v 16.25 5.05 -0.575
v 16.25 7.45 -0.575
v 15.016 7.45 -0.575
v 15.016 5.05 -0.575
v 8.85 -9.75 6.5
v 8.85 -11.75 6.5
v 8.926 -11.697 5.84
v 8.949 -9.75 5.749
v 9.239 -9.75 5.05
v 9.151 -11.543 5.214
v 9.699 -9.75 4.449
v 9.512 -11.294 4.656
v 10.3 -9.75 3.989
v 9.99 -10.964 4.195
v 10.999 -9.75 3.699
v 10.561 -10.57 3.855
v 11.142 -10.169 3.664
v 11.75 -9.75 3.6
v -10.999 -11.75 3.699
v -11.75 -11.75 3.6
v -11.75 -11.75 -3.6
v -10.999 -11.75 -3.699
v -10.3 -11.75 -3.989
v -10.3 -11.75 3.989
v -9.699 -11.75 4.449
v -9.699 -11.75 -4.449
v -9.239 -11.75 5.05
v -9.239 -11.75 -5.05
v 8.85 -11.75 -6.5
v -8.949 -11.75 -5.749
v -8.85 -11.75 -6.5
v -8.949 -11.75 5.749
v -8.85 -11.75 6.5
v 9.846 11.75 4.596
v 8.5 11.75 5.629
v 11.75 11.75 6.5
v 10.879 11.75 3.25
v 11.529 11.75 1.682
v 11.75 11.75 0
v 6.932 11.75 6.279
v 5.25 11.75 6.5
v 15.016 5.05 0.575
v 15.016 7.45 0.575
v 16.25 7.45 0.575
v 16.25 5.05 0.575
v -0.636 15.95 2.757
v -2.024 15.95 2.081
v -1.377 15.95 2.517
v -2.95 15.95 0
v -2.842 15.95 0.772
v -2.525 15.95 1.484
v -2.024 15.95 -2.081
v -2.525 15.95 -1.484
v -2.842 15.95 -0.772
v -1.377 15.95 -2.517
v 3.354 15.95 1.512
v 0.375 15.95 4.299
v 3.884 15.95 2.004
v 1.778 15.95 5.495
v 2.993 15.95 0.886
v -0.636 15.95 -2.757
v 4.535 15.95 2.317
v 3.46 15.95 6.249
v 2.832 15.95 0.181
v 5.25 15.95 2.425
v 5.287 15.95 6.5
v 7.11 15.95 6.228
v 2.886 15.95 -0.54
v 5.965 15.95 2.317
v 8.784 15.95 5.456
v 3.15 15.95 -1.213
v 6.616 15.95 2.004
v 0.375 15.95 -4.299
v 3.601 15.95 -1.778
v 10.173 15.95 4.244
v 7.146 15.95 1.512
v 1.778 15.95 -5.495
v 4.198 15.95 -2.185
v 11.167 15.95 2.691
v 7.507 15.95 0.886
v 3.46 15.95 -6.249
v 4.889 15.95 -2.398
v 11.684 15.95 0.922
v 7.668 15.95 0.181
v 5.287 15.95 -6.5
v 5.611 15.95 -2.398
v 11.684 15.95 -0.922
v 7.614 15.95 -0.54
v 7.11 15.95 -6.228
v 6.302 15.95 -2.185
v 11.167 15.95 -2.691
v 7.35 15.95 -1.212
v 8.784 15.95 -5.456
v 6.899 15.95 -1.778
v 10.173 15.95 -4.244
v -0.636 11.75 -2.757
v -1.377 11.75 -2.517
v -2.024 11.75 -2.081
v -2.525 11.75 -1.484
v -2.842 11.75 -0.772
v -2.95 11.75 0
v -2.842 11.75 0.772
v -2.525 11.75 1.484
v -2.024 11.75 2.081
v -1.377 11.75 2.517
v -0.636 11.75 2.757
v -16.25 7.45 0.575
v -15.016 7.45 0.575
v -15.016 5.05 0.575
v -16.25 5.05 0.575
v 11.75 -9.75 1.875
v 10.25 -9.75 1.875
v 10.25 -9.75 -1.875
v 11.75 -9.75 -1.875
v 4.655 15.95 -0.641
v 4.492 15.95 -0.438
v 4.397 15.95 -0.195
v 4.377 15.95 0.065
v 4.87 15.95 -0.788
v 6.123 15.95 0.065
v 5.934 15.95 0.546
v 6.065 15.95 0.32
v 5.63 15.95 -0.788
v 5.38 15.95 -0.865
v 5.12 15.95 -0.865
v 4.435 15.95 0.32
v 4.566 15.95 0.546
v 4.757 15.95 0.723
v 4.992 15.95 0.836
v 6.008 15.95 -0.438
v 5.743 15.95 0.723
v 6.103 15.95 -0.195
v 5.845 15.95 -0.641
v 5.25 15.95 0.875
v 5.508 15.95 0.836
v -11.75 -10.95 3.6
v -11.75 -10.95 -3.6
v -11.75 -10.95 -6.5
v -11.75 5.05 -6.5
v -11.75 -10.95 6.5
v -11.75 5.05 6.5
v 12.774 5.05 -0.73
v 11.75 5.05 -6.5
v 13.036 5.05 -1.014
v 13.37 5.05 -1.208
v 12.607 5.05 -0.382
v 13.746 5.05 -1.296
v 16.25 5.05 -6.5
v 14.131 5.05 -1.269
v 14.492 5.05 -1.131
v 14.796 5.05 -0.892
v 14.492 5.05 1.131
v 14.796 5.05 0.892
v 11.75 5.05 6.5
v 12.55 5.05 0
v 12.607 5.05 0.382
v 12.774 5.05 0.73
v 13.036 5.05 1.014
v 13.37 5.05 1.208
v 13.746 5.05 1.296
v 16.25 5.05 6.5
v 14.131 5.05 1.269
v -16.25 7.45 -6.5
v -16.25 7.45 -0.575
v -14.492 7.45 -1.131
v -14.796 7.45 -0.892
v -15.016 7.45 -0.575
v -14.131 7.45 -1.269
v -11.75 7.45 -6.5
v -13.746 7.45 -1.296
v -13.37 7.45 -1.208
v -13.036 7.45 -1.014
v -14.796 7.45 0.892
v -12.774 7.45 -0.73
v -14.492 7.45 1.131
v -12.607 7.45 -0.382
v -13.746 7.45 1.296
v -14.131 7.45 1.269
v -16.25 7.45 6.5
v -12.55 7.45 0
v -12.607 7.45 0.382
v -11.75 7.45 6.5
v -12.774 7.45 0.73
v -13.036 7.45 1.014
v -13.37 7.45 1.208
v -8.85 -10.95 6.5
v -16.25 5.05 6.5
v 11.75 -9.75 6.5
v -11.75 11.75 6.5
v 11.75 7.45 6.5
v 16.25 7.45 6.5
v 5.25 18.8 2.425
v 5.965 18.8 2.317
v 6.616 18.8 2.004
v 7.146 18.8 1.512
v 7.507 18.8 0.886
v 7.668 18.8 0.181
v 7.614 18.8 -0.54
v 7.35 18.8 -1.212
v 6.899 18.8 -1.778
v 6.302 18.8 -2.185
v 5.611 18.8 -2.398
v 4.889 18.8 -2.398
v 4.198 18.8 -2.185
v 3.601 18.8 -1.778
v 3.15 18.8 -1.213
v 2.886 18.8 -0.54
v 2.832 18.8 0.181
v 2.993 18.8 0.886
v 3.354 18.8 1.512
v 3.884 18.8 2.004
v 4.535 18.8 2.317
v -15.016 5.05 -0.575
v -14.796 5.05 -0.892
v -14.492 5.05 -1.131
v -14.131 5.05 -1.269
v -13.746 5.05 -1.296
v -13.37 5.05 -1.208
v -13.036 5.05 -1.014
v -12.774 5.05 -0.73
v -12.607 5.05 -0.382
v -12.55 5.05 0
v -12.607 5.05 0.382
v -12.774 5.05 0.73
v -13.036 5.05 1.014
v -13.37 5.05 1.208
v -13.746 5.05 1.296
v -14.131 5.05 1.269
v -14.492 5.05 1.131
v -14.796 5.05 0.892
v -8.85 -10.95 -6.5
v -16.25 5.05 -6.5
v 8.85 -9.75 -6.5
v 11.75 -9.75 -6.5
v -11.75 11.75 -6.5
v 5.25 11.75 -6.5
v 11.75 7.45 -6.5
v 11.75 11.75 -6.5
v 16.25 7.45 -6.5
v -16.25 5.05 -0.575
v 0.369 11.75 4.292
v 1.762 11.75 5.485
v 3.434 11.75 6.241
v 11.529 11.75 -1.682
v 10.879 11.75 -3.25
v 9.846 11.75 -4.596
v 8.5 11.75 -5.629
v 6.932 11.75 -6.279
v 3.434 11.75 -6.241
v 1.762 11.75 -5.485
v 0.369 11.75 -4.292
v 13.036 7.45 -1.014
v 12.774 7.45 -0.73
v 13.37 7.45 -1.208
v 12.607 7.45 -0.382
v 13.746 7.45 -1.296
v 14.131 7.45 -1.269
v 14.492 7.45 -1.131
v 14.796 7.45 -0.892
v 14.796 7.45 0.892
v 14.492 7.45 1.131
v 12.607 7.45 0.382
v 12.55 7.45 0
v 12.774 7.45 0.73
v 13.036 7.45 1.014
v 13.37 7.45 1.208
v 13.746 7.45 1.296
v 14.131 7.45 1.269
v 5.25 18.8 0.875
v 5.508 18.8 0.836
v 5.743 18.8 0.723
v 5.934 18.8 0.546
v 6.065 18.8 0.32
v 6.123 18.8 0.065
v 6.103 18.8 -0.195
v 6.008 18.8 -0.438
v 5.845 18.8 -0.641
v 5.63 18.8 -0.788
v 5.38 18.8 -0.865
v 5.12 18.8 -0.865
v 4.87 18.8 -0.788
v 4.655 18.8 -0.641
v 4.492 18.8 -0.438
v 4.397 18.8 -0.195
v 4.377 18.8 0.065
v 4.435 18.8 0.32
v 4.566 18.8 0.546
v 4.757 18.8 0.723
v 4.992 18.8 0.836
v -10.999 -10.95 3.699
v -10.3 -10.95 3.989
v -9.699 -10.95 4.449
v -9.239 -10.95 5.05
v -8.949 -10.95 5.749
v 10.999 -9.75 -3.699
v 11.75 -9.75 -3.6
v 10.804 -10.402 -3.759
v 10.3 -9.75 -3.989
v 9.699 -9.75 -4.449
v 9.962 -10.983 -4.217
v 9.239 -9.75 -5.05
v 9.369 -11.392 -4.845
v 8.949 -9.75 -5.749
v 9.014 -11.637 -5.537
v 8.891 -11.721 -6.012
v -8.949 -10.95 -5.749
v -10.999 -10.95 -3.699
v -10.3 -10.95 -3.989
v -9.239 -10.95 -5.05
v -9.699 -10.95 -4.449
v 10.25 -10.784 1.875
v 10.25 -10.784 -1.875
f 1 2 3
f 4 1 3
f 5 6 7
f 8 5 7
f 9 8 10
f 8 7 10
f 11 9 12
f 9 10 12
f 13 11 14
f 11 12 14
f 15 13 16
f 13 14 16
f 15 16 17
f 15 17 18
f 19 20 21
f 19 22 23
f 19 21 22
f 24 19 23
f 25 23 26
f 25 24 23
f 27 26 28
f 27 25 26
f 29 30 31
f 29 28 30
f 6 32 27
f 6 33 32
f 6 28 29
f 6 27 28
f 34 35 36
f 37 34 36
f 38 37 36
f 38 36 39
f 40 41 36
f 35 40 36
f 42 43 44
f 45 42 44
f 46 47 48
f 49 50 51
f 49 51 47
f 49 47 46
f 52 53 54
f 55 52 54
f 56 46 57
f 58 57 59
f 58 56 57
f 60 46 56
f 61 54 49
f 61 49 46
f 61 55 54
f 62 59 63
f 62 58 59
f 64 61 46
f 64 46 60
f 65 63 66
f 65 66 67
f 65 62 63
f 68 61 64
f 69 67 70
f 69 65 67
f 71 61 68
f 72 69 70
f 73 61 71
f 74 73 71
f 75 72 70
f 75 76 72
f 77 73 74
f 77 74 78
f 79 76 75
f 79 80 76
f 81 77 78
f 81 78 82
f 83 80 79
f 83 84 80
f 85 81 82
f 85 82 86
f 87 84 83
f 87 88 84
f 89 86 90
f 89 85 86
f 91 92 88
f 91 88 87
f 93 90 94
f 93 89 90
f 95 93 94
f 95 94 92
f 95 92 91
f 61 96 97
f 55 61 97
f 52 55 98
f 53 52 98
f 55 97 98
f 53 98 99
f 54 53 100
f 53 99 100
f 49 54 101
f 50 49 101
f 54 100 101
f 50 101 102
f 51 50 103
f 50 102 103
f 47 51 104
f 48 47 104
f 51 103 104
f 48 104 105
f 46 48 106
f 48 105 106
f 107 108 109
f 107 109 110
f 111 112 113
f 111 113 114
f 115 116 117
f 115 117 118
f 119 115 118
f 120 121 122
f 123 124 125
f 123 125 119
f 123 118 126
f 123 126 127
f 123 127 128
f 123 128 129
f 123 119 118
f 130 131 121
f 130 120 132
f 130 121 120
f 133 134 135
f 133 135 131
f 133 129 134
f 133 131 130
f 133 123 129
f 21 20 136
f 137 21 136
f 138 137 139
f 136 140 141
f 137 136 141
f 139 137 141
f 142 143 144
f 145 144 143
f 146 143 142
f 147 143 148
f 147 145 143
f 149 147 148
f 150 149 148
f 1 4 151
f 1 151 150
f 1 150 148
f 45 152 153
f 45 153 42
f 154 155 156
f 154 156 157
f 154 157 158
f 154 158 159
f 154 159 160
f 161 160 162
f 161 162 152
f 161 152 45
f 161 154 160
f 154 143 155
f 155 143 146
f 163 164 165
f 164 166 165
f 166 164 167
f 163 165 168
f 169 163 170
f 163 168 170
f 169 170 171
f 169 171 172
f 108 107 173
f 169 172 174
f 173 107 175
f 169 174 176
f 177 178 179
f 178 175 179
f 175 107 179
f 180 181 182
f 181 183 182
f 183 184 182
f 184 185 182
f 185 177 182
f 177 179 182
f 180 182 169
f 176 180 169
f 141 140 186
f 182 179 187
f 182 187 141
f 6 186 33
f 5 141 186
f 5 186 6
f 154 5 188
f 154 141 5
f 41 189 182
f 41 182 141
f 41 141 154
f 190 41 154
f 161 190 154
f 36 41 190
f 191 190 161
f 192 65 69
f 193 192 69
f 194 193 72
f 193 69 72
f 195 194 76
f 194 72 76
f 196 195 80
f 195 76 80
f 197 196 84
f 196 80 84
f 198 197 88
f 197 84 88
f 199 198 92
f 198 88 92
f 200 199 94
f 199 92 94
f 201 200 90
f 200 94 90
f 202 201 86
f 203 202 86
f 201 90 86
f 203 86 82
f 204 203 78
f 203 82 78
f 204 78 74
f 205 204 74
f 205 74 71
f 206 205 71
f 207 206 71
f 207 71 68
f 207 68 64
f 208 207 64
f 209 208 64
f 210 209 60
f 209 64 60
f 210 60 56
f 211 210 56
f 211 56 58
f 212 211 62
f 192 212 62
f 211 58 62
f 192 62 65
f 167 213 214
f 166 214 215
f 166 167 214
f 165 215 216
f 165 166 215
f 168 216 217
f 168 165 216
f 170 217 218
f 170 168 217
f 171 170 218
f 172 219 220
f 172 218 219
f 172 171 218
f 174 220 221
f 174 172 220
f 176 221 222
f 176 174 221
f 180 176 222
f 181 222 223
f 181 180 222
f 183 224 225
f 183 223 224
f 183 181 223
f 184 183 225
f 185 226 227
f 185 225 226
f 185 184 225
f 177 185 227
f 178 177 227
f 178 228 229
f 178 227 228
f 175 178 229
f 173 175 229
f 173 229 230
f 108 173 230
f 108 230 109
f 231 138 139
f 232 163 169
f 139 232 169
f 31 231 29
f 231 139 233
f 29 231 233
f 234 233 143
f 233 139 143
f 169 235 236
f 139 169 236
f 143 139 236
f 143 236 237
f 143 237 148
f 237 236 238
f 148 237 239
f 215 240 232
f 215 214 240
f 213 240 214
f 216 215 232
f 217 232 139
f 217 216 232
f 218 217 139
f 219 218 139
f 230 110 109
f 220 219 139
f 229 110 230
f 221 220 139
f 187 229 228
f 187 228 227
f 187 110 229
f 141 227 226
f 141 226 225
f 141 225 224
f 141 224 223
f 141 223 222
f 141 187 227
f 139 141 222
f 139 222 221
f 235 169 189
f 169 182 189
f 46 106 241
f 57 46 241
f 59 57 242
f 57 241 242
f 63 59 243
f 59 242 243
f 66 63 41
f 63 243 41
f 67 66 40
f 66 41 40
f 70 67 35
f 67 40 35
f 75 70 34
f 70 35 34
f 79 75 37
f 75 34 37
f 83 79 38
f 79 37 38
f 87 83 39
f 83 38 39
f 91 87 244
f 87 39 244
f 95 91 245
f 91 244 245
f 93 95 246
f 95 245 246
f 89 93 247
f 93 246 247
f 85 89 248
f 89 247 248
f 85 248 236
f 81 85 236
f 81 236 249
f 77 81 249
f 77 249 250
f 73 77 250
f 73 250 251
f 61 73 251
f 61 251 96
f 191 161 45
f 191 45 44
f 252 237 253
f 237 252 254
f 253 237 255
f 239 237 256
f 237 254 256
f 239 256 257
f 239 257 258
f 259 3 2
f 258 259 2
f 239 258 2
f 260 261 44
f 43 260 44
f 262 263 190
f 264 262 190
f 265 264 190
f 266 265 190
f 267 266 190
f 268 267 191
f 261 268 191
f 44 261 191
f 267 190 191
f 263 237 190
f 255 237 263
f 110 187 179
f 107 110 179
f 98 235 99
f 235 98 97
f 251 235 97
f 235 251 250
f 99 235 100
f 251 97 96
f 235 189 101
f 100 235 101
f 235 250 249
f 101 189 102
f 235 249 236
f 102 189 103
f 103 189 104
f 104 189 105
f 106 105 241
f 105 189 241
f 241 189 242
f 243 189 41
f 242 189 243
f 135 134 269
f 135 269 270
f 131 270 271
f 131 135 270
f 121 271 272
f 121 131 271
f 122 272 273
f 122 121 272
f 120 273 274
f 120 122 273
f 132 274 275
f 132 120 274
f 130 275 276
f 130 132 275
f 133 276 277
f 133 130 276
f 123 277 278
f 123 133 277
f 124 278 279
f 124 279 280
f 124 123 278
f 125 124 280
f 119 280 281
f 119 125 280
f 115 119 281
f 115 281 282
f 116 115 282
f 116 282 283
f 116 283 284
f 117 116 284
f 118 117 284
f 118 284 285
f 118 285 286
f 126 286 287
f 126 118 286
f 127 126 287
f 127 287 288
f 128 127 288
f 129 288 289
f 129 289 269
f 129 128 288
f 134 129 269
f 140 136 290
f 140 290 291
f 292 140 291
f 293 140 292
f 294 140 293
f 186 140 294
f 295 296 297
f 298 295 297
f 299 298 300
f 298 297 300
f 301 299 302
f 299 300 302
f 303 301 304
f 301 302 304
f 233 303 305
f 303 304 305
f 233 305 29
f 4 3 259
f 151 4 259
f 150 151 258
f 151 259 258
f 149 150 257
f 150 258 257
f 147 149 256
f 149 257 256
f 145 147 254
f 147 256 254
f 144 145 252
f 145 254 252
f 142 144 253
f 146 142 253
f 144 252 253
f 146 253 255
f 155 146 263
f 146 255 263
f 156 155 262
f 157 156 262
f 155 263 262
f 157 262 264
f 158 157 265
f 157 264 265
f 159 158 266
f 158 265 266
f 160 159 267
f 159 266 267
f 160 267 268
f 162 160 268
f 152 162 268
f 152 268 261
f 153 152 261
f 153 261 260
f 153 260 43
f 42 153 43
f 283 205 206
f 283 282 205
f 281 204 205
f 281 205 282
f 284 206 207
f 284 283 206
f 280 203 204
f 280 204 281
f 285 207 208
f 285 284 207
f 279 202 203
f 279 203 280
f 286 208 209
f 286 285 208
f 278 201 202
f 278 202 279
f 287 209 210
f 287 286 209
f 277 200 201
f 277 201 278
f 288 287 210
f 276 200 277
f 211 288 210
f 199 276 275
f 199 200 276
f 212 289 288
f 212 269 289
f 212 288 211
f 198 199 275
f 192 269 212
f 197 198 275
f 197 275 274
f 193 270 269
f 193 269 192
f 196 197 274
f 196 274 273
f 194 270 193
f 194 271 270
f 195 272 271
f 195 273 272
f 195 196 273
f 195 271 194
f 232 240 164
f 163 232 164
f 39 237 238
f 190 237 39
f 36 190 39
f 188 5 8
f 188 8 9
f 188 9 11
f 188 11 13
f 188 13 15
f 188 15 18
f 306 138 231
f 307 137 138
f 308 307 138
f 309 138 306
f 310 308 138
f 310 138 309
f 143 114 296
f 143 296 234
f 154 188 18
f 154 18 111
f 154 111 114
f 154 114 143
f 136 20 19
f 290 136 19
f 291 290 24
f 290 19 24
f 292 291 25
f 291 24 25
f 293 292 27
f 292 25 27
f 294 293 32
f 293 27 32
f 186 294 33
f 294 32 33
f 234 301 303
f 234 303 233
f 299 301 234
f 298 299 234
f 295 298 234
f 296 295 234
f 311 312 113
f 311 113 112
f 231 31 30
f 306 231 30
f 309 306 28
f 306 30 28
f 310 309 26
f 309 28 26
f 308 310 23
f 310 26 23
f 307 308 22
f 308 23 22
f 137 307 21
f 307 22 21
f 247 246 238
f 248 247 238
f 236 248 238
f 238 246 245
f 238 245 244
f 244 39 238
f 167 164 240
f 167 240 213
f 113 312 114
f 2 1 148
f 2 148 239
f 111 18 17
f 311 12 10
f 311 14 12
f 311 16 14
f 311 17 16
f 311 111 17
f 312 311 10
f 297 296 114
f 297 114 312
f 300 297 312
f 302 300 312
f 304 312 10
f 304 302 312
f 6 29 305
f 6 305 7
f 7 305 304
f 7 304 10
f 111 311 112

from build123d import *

# Parameters (mm, degrees)
SALIENTE_EXTRUIR1_DEPTH = 6.5
SALIENTE_EXTRUIR2_DEPTH = 4.2
CORTAR_EXTRUIR1_REACH   = 27.98
CORTAR_EXTRUIR3_DEPTH   = 0.8
CROQUIS4_5_W            = 1.5
CROQUIS4_5_H            = 3.75
CORTAR_EXTRUIR4_DEPTH   = 2
CORTAR_EXTRUIR5_DEPTH   = 27.219553772
CROQUIS7_R              = 2.425
CROQUIS7_R_2            = 0.875
SALIENTE_EXTRUIR4_DEPTH = 2.85


with BuildPart() as part:
    # Croquis1 → Saliente-Extruir1 (new, symmetric)
    with BuildSketch(Plane.XY):
        Polygon((-11.75, 5.05), (-11.75, -11.75), (11.75, -11.75), (11.75, 5.05), (16.25, 5.05), (16.25, 7.45), (11.75, 7.45), (11.75, 11.75), (-11.75, 11.75), (-11.75, 7.45), (-16.25, 7.45), (-16.25, 5.05), align=None)
    extrude(amount=SALIENTE_EXTRUIR1_DEPTH, both=True)

    # Croquis2 → Saliente-Extruir2 (add)
    with BuildSketch(Plane(origin=(0, 11.75, 0), x_dir=(1, 0, 0), z_dir=(0, 1, 0))):
        with BuildLine():
            ThreePointArc((-0.636111111, -2.757480007), (11.75, 0), (-0.636111111, 2.757480007))
            ThreePointArc((-0.636111111, 2.757480007), (-2.95, 0), (-0.636111111, -2.757480007))
        make_face()
    extrude(amount=SALIENTE_EXTRUIR2_DEPTH)

    # Croquis3 → Cortar-Extruir1 (cut, up to next)
    with BuildSketch(Plane(origin=(0, 7.45, 0), x_dir=(1, 0, 0), z_dir=(0, 1, 0)), mode=Mode.PRIVATE) as cortar_extruir1_sk1:
        with BuildLine():
            Line((16.25, 0.575), (15.015922382, 0.575))
            ThreePointArc((15.015922382, 0.575), (12.55, 0), (15.015922382, -0.575))
            Line((15.015922382, -0.575), (16.25, -0.575))
            Line((16.25, -0.575), (16.25, 0.575))
        make_face()
    cortar_extruir1_tool1 = extrude(cortar_extruir1_sk1.sketch, amount=-CORTAR_EXTRUIR1_REACH, mode=Mode.PRIVATE) & part.part
    # Croquis3 → Cortar-Extruir1 (cut, up to next)
    with BuildSketch(Plane(origin=(0, 7.45, 0), x_dir=(1, 0, 0), z_dir=(0, 1, 0)), mode=Mode.PRIVATE) as cortar_extruir1_sk2:
        with BuildLine():
            Line((-16.25, 0.575), (-15.015922382, 0.575))
            ThreePointArc((-15.015922382, 0.575), (-12.55, 0), (-15.015922382, -0.575))
            Line((-15.015922382, -0.575), (-16.25, -0.575))
            Line((-16.25, -0.575), (-16.25, 0.575))
        make_face()
    cortar_extruir1_tool2 = extrude(cortar_extruir1_sk2.sketch, amount=-CORTAR_EXTRUIR1_REACH, mode=Mode.PRIVATE) & part.part
    add(cortar_extruir1_tool1.solids().sort_by_distance((14.212834, 7.45, 0))[0], mode=Mode.SUBTRACT)
    add(cortar_extruir1_tool2.solids().sort_by_distance((-14.212834, 7.45, 0))[0], mode=Mode.SUBTRACT)

    # Croquis4 → Cortar-Extruir3 (cut)
    with BuildSketch(Plane.XZ.offset(11.75)):
        with BuildLine():
            Line((-11.75, 6.5), (-11.75, 3.6))
            ThreePointArc((-11.75, 3.6), (-9.699390335, 4.449390335), (-8.85, 6.5))
            Line((-8.85, 6.5), (-11.75, 6.5))
        make_face()
        with BuildLine():
            ThreePointArc((-8.85, -6.5), (-9.699390335, -4.449390335), (-11.75, -3.6))
            Line((-11.75, -3.6), (-11.75, -6.5))
            Line((-11.75, -6.5), (-8.85, -6.5))
        make_face()
    extrude(amount=-CORTAR_EXTRUIR3_DEPTH, mode=Mode.SUBTRACT)

    # Croquis4<5> → Cortar-Extruir4 (cut)
    with BuildSketch(Plane.XZ.offset(11.75)):
        with BuildLine():
            Line((11.75, 6.5), (8.85, 6.5))
            ThreePointArc((8.85, 6.5), (9.699390335, 4.449390335), (11.75, 3.6))
            Line((11.75, 3.6), (11.75, 6.5))
        make_face()
        with BuildLine():
            ThreePointArc((11.75, -3.6), (9.699390335, -4.449390335), (8.85, -6.5))
            Line((8.85, -6.5), (11.75, -6.5))
            Line((11.75, -6.5), (11.75, -3.6))
        make_face()
        with Locations((11, 0)):
            Rectangle(CROQUIS4_5_W, CROQUIS4_5_H)
    extrude(amount=-CORTAR_EXTRUIR4_DEPTH, mode=Mode.SUBTRACT)

    # Croquis6 → Cortar-Extruir5 (cut, through all)
    with BuildSketch(Plane(origin=(0, 0, -6.5), x_dir=(-1, 0, 0), z_dir=(0, 0, -1))):
        Polygon((-11.75, -9.75), (-8.85, -11.75), (-11.75, -11.75), align=None)
    extrude(amount=-CORTAR_EXTRUIR5_DEPTH, mode=Mode.SUBTRACT)

    # Croquis7 → Saliente-Extruir4 (add)
    with BuildSketch(Plane(origin=(0, 15.95, 0), x_dir=(1, 0, 0), z_dir=(0, 1, 0))):
        with Locations((5.25, 0)):
            Circle(CROQUIS7_R)
        with Locations((5.25, 0)):
            Circle(CROQUIS7_R_2, mode=Mode.SUBTRACT)
    extrude(amount=SALIENTE_EXTRUIR4_DEPTH)


solid = part.part
